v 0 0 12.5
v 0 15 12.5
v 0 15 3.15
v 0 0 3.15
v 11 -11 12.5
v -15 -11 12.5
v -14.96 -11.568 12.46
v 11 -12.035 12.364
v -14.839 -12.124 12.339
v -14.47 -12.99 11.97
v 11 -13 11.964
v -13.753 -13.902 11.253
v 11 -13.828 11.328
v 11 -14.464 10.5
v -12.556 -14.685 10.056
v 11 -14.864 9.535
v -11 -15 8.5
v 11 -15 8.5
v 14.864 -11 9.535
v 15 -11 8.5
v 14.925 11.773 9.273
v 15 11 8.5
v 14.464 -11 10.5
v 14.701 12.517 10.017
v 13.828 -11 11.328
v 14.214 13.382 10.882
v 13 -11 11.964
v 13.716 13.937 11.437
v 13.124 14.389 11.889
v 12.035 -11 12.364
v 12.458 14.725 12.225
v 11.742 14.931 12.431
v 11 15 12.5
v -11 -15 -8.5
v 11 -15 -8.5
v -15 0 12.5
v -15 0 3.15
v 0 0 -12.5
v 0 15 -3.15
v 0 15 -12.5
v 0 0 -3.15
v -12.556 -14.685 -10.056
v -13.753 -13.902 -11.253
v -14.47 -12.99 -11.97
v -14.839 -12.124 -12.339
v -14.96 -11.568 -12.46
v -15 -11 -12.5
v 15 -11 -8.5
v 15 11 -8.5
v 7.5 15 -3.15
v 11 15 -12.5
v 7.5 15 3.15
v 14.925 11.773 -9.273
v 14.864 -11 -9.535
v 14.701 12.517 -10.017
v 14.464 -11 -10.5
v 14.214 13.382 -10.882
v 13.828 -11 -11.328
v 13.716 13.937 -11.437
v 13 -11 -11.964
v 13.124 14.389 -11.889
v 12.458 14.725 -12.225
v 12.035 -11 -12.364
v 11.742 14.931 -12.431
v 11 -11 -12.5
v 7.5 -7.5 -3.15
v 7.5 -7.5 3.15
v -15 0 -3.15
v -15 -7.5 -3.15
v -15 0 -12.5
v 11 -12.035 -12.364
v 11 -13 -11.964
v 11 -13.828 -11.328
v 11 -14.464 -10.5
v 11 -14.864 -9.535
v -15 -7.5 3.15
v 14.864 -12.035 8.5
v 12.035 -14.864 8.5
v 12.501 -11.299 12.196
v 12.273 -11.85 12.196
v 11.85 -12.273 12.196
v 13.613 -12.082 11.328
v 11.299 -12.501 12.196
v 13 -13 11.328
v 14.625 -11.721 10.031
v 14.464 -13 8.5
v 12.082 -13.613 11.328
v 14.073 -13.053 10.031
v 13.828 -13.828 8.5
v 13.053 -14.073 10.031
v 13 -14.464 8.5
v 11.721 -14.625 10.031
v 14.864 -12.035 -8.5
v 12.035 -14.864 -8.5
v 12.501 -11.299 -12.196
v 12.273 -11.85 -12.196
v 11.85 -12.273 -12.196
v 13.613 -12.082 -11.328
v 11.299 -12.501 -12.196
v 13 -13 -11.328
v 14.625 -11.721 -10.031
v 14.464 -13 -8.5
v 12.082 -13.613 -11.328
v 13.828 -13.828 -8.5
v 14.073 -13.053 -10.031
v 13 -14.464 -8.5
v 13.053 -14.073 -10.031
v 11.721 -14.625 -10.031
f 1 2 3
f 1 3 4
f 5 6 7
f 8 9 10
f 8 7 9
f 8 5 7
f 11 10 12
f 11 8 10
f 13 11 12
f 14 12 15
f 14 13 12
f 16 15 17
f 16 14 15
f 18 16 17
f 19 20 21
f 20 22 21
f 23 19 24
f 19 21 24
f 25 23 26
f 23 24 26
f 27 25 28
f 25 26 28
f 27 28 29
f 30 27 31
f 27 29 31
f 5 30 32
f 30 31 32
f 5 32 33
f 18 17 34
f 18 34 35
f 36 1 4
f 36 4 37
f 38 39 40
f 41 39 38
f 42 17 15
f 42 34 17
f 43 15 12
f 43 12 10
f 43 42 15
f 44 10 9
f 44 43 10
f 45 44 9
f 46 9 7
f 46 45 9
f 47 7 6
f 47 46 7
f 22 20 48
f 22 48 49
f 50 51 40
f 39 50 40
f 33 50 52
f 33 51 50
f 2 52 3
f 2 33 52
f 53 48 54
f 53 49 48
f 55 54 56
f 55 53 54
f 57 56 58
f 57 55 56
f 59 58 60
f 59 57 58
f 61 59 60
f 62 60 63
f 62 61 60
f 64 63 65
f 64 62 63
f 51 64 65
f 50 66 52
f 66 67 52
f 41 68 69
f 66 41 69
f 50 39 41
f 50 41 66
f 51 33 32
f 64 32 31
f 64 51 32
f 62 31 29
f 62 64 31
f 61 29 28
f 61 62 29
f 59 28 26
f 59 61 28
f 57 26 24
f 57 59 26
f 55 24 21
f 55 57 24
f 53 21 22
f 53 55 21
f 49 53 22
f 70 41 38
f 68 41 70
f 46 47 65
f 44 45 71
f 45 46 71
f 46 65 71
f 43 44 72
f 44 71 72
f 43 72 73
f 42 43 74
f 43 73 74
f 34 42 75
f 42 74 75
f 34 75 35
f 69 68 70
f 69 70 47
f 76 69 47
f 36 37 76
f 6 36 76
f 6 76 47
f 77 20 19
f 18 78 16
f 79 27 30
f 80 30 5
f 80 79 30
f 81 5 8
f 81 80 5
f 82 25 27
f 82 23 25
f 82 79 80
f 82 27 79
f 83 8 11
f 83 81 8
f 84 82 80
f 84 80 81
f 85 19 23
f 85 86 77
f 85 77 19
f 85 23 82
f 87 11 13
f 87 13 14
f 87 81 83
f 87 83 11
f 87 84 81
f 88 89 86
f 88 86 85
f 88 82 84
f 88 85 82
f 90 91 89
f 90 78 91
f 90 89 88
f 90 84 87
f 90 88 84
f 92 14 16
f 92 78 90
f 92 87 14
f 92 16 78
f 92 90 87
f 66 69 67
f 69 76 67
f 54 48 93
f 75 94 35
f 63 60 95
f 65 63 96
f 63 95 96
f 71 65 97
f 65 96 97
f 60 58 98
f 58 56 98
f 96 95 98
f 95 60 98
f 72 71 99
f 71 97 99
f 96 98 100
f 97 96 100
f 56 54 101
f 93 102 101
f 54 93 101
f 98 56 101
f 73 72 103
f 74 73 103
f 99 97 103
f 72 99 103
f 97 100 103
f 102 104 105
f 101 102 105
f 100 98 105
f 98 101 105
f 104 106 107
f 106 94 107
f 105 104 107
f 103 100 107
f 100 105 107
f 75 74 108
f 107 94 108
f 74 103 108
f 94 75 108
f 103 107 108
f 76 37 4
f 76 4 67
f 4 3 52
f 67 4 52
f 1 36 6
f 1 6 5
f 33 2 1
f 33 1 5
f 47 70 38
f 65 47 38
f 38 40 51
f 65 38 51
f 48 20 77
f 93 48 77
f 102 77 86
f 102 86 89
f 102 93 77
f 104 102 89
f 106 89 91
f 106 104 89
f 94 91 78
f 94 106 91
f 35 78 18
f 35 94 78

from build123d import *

# Parameters (mm, degrees)
F1_DEPTH = 12.5
F3_DEPTH = 3.15
F4_R     = 4


with BuildPart() as f1:
    # F0 (on Top) → F1 (new body, symmetric)
    with BuildSketch(Plane.XY):
        Polygon((15, 15), (0, 15), (0, 0), (-15, 0), (-15, -15), (15, -15), align=None)
    extrude(amount=F1_DEPTH, both=True)

    # F2 (on Top) → F3 (cut, symmetric)
    with BuildSketch(Plane.XY):
        Polygon((7.5, 15), (0, 15), (0, 0), (-15, 0), (-15, -7.5), (7.5, -7.5), align=None)
    extrude(amount=F3_DEPTH, both=True, mode=Mode.SUBTRACT)

    # F4
    f4_edges = [f1.edges().sort_by_distance(p)[0] for p in [
        (-15, -15, 0),
        (15, -15, 0),
        (15, 15, 0),
        (15, 0, 12.5),
        (0, -15, 12.5),
        (15, 0, -12.5),
        (0, -15, -12.5),
    ]]
    fillet(f4_edges, radius=F4_R)


solid = f1.part
